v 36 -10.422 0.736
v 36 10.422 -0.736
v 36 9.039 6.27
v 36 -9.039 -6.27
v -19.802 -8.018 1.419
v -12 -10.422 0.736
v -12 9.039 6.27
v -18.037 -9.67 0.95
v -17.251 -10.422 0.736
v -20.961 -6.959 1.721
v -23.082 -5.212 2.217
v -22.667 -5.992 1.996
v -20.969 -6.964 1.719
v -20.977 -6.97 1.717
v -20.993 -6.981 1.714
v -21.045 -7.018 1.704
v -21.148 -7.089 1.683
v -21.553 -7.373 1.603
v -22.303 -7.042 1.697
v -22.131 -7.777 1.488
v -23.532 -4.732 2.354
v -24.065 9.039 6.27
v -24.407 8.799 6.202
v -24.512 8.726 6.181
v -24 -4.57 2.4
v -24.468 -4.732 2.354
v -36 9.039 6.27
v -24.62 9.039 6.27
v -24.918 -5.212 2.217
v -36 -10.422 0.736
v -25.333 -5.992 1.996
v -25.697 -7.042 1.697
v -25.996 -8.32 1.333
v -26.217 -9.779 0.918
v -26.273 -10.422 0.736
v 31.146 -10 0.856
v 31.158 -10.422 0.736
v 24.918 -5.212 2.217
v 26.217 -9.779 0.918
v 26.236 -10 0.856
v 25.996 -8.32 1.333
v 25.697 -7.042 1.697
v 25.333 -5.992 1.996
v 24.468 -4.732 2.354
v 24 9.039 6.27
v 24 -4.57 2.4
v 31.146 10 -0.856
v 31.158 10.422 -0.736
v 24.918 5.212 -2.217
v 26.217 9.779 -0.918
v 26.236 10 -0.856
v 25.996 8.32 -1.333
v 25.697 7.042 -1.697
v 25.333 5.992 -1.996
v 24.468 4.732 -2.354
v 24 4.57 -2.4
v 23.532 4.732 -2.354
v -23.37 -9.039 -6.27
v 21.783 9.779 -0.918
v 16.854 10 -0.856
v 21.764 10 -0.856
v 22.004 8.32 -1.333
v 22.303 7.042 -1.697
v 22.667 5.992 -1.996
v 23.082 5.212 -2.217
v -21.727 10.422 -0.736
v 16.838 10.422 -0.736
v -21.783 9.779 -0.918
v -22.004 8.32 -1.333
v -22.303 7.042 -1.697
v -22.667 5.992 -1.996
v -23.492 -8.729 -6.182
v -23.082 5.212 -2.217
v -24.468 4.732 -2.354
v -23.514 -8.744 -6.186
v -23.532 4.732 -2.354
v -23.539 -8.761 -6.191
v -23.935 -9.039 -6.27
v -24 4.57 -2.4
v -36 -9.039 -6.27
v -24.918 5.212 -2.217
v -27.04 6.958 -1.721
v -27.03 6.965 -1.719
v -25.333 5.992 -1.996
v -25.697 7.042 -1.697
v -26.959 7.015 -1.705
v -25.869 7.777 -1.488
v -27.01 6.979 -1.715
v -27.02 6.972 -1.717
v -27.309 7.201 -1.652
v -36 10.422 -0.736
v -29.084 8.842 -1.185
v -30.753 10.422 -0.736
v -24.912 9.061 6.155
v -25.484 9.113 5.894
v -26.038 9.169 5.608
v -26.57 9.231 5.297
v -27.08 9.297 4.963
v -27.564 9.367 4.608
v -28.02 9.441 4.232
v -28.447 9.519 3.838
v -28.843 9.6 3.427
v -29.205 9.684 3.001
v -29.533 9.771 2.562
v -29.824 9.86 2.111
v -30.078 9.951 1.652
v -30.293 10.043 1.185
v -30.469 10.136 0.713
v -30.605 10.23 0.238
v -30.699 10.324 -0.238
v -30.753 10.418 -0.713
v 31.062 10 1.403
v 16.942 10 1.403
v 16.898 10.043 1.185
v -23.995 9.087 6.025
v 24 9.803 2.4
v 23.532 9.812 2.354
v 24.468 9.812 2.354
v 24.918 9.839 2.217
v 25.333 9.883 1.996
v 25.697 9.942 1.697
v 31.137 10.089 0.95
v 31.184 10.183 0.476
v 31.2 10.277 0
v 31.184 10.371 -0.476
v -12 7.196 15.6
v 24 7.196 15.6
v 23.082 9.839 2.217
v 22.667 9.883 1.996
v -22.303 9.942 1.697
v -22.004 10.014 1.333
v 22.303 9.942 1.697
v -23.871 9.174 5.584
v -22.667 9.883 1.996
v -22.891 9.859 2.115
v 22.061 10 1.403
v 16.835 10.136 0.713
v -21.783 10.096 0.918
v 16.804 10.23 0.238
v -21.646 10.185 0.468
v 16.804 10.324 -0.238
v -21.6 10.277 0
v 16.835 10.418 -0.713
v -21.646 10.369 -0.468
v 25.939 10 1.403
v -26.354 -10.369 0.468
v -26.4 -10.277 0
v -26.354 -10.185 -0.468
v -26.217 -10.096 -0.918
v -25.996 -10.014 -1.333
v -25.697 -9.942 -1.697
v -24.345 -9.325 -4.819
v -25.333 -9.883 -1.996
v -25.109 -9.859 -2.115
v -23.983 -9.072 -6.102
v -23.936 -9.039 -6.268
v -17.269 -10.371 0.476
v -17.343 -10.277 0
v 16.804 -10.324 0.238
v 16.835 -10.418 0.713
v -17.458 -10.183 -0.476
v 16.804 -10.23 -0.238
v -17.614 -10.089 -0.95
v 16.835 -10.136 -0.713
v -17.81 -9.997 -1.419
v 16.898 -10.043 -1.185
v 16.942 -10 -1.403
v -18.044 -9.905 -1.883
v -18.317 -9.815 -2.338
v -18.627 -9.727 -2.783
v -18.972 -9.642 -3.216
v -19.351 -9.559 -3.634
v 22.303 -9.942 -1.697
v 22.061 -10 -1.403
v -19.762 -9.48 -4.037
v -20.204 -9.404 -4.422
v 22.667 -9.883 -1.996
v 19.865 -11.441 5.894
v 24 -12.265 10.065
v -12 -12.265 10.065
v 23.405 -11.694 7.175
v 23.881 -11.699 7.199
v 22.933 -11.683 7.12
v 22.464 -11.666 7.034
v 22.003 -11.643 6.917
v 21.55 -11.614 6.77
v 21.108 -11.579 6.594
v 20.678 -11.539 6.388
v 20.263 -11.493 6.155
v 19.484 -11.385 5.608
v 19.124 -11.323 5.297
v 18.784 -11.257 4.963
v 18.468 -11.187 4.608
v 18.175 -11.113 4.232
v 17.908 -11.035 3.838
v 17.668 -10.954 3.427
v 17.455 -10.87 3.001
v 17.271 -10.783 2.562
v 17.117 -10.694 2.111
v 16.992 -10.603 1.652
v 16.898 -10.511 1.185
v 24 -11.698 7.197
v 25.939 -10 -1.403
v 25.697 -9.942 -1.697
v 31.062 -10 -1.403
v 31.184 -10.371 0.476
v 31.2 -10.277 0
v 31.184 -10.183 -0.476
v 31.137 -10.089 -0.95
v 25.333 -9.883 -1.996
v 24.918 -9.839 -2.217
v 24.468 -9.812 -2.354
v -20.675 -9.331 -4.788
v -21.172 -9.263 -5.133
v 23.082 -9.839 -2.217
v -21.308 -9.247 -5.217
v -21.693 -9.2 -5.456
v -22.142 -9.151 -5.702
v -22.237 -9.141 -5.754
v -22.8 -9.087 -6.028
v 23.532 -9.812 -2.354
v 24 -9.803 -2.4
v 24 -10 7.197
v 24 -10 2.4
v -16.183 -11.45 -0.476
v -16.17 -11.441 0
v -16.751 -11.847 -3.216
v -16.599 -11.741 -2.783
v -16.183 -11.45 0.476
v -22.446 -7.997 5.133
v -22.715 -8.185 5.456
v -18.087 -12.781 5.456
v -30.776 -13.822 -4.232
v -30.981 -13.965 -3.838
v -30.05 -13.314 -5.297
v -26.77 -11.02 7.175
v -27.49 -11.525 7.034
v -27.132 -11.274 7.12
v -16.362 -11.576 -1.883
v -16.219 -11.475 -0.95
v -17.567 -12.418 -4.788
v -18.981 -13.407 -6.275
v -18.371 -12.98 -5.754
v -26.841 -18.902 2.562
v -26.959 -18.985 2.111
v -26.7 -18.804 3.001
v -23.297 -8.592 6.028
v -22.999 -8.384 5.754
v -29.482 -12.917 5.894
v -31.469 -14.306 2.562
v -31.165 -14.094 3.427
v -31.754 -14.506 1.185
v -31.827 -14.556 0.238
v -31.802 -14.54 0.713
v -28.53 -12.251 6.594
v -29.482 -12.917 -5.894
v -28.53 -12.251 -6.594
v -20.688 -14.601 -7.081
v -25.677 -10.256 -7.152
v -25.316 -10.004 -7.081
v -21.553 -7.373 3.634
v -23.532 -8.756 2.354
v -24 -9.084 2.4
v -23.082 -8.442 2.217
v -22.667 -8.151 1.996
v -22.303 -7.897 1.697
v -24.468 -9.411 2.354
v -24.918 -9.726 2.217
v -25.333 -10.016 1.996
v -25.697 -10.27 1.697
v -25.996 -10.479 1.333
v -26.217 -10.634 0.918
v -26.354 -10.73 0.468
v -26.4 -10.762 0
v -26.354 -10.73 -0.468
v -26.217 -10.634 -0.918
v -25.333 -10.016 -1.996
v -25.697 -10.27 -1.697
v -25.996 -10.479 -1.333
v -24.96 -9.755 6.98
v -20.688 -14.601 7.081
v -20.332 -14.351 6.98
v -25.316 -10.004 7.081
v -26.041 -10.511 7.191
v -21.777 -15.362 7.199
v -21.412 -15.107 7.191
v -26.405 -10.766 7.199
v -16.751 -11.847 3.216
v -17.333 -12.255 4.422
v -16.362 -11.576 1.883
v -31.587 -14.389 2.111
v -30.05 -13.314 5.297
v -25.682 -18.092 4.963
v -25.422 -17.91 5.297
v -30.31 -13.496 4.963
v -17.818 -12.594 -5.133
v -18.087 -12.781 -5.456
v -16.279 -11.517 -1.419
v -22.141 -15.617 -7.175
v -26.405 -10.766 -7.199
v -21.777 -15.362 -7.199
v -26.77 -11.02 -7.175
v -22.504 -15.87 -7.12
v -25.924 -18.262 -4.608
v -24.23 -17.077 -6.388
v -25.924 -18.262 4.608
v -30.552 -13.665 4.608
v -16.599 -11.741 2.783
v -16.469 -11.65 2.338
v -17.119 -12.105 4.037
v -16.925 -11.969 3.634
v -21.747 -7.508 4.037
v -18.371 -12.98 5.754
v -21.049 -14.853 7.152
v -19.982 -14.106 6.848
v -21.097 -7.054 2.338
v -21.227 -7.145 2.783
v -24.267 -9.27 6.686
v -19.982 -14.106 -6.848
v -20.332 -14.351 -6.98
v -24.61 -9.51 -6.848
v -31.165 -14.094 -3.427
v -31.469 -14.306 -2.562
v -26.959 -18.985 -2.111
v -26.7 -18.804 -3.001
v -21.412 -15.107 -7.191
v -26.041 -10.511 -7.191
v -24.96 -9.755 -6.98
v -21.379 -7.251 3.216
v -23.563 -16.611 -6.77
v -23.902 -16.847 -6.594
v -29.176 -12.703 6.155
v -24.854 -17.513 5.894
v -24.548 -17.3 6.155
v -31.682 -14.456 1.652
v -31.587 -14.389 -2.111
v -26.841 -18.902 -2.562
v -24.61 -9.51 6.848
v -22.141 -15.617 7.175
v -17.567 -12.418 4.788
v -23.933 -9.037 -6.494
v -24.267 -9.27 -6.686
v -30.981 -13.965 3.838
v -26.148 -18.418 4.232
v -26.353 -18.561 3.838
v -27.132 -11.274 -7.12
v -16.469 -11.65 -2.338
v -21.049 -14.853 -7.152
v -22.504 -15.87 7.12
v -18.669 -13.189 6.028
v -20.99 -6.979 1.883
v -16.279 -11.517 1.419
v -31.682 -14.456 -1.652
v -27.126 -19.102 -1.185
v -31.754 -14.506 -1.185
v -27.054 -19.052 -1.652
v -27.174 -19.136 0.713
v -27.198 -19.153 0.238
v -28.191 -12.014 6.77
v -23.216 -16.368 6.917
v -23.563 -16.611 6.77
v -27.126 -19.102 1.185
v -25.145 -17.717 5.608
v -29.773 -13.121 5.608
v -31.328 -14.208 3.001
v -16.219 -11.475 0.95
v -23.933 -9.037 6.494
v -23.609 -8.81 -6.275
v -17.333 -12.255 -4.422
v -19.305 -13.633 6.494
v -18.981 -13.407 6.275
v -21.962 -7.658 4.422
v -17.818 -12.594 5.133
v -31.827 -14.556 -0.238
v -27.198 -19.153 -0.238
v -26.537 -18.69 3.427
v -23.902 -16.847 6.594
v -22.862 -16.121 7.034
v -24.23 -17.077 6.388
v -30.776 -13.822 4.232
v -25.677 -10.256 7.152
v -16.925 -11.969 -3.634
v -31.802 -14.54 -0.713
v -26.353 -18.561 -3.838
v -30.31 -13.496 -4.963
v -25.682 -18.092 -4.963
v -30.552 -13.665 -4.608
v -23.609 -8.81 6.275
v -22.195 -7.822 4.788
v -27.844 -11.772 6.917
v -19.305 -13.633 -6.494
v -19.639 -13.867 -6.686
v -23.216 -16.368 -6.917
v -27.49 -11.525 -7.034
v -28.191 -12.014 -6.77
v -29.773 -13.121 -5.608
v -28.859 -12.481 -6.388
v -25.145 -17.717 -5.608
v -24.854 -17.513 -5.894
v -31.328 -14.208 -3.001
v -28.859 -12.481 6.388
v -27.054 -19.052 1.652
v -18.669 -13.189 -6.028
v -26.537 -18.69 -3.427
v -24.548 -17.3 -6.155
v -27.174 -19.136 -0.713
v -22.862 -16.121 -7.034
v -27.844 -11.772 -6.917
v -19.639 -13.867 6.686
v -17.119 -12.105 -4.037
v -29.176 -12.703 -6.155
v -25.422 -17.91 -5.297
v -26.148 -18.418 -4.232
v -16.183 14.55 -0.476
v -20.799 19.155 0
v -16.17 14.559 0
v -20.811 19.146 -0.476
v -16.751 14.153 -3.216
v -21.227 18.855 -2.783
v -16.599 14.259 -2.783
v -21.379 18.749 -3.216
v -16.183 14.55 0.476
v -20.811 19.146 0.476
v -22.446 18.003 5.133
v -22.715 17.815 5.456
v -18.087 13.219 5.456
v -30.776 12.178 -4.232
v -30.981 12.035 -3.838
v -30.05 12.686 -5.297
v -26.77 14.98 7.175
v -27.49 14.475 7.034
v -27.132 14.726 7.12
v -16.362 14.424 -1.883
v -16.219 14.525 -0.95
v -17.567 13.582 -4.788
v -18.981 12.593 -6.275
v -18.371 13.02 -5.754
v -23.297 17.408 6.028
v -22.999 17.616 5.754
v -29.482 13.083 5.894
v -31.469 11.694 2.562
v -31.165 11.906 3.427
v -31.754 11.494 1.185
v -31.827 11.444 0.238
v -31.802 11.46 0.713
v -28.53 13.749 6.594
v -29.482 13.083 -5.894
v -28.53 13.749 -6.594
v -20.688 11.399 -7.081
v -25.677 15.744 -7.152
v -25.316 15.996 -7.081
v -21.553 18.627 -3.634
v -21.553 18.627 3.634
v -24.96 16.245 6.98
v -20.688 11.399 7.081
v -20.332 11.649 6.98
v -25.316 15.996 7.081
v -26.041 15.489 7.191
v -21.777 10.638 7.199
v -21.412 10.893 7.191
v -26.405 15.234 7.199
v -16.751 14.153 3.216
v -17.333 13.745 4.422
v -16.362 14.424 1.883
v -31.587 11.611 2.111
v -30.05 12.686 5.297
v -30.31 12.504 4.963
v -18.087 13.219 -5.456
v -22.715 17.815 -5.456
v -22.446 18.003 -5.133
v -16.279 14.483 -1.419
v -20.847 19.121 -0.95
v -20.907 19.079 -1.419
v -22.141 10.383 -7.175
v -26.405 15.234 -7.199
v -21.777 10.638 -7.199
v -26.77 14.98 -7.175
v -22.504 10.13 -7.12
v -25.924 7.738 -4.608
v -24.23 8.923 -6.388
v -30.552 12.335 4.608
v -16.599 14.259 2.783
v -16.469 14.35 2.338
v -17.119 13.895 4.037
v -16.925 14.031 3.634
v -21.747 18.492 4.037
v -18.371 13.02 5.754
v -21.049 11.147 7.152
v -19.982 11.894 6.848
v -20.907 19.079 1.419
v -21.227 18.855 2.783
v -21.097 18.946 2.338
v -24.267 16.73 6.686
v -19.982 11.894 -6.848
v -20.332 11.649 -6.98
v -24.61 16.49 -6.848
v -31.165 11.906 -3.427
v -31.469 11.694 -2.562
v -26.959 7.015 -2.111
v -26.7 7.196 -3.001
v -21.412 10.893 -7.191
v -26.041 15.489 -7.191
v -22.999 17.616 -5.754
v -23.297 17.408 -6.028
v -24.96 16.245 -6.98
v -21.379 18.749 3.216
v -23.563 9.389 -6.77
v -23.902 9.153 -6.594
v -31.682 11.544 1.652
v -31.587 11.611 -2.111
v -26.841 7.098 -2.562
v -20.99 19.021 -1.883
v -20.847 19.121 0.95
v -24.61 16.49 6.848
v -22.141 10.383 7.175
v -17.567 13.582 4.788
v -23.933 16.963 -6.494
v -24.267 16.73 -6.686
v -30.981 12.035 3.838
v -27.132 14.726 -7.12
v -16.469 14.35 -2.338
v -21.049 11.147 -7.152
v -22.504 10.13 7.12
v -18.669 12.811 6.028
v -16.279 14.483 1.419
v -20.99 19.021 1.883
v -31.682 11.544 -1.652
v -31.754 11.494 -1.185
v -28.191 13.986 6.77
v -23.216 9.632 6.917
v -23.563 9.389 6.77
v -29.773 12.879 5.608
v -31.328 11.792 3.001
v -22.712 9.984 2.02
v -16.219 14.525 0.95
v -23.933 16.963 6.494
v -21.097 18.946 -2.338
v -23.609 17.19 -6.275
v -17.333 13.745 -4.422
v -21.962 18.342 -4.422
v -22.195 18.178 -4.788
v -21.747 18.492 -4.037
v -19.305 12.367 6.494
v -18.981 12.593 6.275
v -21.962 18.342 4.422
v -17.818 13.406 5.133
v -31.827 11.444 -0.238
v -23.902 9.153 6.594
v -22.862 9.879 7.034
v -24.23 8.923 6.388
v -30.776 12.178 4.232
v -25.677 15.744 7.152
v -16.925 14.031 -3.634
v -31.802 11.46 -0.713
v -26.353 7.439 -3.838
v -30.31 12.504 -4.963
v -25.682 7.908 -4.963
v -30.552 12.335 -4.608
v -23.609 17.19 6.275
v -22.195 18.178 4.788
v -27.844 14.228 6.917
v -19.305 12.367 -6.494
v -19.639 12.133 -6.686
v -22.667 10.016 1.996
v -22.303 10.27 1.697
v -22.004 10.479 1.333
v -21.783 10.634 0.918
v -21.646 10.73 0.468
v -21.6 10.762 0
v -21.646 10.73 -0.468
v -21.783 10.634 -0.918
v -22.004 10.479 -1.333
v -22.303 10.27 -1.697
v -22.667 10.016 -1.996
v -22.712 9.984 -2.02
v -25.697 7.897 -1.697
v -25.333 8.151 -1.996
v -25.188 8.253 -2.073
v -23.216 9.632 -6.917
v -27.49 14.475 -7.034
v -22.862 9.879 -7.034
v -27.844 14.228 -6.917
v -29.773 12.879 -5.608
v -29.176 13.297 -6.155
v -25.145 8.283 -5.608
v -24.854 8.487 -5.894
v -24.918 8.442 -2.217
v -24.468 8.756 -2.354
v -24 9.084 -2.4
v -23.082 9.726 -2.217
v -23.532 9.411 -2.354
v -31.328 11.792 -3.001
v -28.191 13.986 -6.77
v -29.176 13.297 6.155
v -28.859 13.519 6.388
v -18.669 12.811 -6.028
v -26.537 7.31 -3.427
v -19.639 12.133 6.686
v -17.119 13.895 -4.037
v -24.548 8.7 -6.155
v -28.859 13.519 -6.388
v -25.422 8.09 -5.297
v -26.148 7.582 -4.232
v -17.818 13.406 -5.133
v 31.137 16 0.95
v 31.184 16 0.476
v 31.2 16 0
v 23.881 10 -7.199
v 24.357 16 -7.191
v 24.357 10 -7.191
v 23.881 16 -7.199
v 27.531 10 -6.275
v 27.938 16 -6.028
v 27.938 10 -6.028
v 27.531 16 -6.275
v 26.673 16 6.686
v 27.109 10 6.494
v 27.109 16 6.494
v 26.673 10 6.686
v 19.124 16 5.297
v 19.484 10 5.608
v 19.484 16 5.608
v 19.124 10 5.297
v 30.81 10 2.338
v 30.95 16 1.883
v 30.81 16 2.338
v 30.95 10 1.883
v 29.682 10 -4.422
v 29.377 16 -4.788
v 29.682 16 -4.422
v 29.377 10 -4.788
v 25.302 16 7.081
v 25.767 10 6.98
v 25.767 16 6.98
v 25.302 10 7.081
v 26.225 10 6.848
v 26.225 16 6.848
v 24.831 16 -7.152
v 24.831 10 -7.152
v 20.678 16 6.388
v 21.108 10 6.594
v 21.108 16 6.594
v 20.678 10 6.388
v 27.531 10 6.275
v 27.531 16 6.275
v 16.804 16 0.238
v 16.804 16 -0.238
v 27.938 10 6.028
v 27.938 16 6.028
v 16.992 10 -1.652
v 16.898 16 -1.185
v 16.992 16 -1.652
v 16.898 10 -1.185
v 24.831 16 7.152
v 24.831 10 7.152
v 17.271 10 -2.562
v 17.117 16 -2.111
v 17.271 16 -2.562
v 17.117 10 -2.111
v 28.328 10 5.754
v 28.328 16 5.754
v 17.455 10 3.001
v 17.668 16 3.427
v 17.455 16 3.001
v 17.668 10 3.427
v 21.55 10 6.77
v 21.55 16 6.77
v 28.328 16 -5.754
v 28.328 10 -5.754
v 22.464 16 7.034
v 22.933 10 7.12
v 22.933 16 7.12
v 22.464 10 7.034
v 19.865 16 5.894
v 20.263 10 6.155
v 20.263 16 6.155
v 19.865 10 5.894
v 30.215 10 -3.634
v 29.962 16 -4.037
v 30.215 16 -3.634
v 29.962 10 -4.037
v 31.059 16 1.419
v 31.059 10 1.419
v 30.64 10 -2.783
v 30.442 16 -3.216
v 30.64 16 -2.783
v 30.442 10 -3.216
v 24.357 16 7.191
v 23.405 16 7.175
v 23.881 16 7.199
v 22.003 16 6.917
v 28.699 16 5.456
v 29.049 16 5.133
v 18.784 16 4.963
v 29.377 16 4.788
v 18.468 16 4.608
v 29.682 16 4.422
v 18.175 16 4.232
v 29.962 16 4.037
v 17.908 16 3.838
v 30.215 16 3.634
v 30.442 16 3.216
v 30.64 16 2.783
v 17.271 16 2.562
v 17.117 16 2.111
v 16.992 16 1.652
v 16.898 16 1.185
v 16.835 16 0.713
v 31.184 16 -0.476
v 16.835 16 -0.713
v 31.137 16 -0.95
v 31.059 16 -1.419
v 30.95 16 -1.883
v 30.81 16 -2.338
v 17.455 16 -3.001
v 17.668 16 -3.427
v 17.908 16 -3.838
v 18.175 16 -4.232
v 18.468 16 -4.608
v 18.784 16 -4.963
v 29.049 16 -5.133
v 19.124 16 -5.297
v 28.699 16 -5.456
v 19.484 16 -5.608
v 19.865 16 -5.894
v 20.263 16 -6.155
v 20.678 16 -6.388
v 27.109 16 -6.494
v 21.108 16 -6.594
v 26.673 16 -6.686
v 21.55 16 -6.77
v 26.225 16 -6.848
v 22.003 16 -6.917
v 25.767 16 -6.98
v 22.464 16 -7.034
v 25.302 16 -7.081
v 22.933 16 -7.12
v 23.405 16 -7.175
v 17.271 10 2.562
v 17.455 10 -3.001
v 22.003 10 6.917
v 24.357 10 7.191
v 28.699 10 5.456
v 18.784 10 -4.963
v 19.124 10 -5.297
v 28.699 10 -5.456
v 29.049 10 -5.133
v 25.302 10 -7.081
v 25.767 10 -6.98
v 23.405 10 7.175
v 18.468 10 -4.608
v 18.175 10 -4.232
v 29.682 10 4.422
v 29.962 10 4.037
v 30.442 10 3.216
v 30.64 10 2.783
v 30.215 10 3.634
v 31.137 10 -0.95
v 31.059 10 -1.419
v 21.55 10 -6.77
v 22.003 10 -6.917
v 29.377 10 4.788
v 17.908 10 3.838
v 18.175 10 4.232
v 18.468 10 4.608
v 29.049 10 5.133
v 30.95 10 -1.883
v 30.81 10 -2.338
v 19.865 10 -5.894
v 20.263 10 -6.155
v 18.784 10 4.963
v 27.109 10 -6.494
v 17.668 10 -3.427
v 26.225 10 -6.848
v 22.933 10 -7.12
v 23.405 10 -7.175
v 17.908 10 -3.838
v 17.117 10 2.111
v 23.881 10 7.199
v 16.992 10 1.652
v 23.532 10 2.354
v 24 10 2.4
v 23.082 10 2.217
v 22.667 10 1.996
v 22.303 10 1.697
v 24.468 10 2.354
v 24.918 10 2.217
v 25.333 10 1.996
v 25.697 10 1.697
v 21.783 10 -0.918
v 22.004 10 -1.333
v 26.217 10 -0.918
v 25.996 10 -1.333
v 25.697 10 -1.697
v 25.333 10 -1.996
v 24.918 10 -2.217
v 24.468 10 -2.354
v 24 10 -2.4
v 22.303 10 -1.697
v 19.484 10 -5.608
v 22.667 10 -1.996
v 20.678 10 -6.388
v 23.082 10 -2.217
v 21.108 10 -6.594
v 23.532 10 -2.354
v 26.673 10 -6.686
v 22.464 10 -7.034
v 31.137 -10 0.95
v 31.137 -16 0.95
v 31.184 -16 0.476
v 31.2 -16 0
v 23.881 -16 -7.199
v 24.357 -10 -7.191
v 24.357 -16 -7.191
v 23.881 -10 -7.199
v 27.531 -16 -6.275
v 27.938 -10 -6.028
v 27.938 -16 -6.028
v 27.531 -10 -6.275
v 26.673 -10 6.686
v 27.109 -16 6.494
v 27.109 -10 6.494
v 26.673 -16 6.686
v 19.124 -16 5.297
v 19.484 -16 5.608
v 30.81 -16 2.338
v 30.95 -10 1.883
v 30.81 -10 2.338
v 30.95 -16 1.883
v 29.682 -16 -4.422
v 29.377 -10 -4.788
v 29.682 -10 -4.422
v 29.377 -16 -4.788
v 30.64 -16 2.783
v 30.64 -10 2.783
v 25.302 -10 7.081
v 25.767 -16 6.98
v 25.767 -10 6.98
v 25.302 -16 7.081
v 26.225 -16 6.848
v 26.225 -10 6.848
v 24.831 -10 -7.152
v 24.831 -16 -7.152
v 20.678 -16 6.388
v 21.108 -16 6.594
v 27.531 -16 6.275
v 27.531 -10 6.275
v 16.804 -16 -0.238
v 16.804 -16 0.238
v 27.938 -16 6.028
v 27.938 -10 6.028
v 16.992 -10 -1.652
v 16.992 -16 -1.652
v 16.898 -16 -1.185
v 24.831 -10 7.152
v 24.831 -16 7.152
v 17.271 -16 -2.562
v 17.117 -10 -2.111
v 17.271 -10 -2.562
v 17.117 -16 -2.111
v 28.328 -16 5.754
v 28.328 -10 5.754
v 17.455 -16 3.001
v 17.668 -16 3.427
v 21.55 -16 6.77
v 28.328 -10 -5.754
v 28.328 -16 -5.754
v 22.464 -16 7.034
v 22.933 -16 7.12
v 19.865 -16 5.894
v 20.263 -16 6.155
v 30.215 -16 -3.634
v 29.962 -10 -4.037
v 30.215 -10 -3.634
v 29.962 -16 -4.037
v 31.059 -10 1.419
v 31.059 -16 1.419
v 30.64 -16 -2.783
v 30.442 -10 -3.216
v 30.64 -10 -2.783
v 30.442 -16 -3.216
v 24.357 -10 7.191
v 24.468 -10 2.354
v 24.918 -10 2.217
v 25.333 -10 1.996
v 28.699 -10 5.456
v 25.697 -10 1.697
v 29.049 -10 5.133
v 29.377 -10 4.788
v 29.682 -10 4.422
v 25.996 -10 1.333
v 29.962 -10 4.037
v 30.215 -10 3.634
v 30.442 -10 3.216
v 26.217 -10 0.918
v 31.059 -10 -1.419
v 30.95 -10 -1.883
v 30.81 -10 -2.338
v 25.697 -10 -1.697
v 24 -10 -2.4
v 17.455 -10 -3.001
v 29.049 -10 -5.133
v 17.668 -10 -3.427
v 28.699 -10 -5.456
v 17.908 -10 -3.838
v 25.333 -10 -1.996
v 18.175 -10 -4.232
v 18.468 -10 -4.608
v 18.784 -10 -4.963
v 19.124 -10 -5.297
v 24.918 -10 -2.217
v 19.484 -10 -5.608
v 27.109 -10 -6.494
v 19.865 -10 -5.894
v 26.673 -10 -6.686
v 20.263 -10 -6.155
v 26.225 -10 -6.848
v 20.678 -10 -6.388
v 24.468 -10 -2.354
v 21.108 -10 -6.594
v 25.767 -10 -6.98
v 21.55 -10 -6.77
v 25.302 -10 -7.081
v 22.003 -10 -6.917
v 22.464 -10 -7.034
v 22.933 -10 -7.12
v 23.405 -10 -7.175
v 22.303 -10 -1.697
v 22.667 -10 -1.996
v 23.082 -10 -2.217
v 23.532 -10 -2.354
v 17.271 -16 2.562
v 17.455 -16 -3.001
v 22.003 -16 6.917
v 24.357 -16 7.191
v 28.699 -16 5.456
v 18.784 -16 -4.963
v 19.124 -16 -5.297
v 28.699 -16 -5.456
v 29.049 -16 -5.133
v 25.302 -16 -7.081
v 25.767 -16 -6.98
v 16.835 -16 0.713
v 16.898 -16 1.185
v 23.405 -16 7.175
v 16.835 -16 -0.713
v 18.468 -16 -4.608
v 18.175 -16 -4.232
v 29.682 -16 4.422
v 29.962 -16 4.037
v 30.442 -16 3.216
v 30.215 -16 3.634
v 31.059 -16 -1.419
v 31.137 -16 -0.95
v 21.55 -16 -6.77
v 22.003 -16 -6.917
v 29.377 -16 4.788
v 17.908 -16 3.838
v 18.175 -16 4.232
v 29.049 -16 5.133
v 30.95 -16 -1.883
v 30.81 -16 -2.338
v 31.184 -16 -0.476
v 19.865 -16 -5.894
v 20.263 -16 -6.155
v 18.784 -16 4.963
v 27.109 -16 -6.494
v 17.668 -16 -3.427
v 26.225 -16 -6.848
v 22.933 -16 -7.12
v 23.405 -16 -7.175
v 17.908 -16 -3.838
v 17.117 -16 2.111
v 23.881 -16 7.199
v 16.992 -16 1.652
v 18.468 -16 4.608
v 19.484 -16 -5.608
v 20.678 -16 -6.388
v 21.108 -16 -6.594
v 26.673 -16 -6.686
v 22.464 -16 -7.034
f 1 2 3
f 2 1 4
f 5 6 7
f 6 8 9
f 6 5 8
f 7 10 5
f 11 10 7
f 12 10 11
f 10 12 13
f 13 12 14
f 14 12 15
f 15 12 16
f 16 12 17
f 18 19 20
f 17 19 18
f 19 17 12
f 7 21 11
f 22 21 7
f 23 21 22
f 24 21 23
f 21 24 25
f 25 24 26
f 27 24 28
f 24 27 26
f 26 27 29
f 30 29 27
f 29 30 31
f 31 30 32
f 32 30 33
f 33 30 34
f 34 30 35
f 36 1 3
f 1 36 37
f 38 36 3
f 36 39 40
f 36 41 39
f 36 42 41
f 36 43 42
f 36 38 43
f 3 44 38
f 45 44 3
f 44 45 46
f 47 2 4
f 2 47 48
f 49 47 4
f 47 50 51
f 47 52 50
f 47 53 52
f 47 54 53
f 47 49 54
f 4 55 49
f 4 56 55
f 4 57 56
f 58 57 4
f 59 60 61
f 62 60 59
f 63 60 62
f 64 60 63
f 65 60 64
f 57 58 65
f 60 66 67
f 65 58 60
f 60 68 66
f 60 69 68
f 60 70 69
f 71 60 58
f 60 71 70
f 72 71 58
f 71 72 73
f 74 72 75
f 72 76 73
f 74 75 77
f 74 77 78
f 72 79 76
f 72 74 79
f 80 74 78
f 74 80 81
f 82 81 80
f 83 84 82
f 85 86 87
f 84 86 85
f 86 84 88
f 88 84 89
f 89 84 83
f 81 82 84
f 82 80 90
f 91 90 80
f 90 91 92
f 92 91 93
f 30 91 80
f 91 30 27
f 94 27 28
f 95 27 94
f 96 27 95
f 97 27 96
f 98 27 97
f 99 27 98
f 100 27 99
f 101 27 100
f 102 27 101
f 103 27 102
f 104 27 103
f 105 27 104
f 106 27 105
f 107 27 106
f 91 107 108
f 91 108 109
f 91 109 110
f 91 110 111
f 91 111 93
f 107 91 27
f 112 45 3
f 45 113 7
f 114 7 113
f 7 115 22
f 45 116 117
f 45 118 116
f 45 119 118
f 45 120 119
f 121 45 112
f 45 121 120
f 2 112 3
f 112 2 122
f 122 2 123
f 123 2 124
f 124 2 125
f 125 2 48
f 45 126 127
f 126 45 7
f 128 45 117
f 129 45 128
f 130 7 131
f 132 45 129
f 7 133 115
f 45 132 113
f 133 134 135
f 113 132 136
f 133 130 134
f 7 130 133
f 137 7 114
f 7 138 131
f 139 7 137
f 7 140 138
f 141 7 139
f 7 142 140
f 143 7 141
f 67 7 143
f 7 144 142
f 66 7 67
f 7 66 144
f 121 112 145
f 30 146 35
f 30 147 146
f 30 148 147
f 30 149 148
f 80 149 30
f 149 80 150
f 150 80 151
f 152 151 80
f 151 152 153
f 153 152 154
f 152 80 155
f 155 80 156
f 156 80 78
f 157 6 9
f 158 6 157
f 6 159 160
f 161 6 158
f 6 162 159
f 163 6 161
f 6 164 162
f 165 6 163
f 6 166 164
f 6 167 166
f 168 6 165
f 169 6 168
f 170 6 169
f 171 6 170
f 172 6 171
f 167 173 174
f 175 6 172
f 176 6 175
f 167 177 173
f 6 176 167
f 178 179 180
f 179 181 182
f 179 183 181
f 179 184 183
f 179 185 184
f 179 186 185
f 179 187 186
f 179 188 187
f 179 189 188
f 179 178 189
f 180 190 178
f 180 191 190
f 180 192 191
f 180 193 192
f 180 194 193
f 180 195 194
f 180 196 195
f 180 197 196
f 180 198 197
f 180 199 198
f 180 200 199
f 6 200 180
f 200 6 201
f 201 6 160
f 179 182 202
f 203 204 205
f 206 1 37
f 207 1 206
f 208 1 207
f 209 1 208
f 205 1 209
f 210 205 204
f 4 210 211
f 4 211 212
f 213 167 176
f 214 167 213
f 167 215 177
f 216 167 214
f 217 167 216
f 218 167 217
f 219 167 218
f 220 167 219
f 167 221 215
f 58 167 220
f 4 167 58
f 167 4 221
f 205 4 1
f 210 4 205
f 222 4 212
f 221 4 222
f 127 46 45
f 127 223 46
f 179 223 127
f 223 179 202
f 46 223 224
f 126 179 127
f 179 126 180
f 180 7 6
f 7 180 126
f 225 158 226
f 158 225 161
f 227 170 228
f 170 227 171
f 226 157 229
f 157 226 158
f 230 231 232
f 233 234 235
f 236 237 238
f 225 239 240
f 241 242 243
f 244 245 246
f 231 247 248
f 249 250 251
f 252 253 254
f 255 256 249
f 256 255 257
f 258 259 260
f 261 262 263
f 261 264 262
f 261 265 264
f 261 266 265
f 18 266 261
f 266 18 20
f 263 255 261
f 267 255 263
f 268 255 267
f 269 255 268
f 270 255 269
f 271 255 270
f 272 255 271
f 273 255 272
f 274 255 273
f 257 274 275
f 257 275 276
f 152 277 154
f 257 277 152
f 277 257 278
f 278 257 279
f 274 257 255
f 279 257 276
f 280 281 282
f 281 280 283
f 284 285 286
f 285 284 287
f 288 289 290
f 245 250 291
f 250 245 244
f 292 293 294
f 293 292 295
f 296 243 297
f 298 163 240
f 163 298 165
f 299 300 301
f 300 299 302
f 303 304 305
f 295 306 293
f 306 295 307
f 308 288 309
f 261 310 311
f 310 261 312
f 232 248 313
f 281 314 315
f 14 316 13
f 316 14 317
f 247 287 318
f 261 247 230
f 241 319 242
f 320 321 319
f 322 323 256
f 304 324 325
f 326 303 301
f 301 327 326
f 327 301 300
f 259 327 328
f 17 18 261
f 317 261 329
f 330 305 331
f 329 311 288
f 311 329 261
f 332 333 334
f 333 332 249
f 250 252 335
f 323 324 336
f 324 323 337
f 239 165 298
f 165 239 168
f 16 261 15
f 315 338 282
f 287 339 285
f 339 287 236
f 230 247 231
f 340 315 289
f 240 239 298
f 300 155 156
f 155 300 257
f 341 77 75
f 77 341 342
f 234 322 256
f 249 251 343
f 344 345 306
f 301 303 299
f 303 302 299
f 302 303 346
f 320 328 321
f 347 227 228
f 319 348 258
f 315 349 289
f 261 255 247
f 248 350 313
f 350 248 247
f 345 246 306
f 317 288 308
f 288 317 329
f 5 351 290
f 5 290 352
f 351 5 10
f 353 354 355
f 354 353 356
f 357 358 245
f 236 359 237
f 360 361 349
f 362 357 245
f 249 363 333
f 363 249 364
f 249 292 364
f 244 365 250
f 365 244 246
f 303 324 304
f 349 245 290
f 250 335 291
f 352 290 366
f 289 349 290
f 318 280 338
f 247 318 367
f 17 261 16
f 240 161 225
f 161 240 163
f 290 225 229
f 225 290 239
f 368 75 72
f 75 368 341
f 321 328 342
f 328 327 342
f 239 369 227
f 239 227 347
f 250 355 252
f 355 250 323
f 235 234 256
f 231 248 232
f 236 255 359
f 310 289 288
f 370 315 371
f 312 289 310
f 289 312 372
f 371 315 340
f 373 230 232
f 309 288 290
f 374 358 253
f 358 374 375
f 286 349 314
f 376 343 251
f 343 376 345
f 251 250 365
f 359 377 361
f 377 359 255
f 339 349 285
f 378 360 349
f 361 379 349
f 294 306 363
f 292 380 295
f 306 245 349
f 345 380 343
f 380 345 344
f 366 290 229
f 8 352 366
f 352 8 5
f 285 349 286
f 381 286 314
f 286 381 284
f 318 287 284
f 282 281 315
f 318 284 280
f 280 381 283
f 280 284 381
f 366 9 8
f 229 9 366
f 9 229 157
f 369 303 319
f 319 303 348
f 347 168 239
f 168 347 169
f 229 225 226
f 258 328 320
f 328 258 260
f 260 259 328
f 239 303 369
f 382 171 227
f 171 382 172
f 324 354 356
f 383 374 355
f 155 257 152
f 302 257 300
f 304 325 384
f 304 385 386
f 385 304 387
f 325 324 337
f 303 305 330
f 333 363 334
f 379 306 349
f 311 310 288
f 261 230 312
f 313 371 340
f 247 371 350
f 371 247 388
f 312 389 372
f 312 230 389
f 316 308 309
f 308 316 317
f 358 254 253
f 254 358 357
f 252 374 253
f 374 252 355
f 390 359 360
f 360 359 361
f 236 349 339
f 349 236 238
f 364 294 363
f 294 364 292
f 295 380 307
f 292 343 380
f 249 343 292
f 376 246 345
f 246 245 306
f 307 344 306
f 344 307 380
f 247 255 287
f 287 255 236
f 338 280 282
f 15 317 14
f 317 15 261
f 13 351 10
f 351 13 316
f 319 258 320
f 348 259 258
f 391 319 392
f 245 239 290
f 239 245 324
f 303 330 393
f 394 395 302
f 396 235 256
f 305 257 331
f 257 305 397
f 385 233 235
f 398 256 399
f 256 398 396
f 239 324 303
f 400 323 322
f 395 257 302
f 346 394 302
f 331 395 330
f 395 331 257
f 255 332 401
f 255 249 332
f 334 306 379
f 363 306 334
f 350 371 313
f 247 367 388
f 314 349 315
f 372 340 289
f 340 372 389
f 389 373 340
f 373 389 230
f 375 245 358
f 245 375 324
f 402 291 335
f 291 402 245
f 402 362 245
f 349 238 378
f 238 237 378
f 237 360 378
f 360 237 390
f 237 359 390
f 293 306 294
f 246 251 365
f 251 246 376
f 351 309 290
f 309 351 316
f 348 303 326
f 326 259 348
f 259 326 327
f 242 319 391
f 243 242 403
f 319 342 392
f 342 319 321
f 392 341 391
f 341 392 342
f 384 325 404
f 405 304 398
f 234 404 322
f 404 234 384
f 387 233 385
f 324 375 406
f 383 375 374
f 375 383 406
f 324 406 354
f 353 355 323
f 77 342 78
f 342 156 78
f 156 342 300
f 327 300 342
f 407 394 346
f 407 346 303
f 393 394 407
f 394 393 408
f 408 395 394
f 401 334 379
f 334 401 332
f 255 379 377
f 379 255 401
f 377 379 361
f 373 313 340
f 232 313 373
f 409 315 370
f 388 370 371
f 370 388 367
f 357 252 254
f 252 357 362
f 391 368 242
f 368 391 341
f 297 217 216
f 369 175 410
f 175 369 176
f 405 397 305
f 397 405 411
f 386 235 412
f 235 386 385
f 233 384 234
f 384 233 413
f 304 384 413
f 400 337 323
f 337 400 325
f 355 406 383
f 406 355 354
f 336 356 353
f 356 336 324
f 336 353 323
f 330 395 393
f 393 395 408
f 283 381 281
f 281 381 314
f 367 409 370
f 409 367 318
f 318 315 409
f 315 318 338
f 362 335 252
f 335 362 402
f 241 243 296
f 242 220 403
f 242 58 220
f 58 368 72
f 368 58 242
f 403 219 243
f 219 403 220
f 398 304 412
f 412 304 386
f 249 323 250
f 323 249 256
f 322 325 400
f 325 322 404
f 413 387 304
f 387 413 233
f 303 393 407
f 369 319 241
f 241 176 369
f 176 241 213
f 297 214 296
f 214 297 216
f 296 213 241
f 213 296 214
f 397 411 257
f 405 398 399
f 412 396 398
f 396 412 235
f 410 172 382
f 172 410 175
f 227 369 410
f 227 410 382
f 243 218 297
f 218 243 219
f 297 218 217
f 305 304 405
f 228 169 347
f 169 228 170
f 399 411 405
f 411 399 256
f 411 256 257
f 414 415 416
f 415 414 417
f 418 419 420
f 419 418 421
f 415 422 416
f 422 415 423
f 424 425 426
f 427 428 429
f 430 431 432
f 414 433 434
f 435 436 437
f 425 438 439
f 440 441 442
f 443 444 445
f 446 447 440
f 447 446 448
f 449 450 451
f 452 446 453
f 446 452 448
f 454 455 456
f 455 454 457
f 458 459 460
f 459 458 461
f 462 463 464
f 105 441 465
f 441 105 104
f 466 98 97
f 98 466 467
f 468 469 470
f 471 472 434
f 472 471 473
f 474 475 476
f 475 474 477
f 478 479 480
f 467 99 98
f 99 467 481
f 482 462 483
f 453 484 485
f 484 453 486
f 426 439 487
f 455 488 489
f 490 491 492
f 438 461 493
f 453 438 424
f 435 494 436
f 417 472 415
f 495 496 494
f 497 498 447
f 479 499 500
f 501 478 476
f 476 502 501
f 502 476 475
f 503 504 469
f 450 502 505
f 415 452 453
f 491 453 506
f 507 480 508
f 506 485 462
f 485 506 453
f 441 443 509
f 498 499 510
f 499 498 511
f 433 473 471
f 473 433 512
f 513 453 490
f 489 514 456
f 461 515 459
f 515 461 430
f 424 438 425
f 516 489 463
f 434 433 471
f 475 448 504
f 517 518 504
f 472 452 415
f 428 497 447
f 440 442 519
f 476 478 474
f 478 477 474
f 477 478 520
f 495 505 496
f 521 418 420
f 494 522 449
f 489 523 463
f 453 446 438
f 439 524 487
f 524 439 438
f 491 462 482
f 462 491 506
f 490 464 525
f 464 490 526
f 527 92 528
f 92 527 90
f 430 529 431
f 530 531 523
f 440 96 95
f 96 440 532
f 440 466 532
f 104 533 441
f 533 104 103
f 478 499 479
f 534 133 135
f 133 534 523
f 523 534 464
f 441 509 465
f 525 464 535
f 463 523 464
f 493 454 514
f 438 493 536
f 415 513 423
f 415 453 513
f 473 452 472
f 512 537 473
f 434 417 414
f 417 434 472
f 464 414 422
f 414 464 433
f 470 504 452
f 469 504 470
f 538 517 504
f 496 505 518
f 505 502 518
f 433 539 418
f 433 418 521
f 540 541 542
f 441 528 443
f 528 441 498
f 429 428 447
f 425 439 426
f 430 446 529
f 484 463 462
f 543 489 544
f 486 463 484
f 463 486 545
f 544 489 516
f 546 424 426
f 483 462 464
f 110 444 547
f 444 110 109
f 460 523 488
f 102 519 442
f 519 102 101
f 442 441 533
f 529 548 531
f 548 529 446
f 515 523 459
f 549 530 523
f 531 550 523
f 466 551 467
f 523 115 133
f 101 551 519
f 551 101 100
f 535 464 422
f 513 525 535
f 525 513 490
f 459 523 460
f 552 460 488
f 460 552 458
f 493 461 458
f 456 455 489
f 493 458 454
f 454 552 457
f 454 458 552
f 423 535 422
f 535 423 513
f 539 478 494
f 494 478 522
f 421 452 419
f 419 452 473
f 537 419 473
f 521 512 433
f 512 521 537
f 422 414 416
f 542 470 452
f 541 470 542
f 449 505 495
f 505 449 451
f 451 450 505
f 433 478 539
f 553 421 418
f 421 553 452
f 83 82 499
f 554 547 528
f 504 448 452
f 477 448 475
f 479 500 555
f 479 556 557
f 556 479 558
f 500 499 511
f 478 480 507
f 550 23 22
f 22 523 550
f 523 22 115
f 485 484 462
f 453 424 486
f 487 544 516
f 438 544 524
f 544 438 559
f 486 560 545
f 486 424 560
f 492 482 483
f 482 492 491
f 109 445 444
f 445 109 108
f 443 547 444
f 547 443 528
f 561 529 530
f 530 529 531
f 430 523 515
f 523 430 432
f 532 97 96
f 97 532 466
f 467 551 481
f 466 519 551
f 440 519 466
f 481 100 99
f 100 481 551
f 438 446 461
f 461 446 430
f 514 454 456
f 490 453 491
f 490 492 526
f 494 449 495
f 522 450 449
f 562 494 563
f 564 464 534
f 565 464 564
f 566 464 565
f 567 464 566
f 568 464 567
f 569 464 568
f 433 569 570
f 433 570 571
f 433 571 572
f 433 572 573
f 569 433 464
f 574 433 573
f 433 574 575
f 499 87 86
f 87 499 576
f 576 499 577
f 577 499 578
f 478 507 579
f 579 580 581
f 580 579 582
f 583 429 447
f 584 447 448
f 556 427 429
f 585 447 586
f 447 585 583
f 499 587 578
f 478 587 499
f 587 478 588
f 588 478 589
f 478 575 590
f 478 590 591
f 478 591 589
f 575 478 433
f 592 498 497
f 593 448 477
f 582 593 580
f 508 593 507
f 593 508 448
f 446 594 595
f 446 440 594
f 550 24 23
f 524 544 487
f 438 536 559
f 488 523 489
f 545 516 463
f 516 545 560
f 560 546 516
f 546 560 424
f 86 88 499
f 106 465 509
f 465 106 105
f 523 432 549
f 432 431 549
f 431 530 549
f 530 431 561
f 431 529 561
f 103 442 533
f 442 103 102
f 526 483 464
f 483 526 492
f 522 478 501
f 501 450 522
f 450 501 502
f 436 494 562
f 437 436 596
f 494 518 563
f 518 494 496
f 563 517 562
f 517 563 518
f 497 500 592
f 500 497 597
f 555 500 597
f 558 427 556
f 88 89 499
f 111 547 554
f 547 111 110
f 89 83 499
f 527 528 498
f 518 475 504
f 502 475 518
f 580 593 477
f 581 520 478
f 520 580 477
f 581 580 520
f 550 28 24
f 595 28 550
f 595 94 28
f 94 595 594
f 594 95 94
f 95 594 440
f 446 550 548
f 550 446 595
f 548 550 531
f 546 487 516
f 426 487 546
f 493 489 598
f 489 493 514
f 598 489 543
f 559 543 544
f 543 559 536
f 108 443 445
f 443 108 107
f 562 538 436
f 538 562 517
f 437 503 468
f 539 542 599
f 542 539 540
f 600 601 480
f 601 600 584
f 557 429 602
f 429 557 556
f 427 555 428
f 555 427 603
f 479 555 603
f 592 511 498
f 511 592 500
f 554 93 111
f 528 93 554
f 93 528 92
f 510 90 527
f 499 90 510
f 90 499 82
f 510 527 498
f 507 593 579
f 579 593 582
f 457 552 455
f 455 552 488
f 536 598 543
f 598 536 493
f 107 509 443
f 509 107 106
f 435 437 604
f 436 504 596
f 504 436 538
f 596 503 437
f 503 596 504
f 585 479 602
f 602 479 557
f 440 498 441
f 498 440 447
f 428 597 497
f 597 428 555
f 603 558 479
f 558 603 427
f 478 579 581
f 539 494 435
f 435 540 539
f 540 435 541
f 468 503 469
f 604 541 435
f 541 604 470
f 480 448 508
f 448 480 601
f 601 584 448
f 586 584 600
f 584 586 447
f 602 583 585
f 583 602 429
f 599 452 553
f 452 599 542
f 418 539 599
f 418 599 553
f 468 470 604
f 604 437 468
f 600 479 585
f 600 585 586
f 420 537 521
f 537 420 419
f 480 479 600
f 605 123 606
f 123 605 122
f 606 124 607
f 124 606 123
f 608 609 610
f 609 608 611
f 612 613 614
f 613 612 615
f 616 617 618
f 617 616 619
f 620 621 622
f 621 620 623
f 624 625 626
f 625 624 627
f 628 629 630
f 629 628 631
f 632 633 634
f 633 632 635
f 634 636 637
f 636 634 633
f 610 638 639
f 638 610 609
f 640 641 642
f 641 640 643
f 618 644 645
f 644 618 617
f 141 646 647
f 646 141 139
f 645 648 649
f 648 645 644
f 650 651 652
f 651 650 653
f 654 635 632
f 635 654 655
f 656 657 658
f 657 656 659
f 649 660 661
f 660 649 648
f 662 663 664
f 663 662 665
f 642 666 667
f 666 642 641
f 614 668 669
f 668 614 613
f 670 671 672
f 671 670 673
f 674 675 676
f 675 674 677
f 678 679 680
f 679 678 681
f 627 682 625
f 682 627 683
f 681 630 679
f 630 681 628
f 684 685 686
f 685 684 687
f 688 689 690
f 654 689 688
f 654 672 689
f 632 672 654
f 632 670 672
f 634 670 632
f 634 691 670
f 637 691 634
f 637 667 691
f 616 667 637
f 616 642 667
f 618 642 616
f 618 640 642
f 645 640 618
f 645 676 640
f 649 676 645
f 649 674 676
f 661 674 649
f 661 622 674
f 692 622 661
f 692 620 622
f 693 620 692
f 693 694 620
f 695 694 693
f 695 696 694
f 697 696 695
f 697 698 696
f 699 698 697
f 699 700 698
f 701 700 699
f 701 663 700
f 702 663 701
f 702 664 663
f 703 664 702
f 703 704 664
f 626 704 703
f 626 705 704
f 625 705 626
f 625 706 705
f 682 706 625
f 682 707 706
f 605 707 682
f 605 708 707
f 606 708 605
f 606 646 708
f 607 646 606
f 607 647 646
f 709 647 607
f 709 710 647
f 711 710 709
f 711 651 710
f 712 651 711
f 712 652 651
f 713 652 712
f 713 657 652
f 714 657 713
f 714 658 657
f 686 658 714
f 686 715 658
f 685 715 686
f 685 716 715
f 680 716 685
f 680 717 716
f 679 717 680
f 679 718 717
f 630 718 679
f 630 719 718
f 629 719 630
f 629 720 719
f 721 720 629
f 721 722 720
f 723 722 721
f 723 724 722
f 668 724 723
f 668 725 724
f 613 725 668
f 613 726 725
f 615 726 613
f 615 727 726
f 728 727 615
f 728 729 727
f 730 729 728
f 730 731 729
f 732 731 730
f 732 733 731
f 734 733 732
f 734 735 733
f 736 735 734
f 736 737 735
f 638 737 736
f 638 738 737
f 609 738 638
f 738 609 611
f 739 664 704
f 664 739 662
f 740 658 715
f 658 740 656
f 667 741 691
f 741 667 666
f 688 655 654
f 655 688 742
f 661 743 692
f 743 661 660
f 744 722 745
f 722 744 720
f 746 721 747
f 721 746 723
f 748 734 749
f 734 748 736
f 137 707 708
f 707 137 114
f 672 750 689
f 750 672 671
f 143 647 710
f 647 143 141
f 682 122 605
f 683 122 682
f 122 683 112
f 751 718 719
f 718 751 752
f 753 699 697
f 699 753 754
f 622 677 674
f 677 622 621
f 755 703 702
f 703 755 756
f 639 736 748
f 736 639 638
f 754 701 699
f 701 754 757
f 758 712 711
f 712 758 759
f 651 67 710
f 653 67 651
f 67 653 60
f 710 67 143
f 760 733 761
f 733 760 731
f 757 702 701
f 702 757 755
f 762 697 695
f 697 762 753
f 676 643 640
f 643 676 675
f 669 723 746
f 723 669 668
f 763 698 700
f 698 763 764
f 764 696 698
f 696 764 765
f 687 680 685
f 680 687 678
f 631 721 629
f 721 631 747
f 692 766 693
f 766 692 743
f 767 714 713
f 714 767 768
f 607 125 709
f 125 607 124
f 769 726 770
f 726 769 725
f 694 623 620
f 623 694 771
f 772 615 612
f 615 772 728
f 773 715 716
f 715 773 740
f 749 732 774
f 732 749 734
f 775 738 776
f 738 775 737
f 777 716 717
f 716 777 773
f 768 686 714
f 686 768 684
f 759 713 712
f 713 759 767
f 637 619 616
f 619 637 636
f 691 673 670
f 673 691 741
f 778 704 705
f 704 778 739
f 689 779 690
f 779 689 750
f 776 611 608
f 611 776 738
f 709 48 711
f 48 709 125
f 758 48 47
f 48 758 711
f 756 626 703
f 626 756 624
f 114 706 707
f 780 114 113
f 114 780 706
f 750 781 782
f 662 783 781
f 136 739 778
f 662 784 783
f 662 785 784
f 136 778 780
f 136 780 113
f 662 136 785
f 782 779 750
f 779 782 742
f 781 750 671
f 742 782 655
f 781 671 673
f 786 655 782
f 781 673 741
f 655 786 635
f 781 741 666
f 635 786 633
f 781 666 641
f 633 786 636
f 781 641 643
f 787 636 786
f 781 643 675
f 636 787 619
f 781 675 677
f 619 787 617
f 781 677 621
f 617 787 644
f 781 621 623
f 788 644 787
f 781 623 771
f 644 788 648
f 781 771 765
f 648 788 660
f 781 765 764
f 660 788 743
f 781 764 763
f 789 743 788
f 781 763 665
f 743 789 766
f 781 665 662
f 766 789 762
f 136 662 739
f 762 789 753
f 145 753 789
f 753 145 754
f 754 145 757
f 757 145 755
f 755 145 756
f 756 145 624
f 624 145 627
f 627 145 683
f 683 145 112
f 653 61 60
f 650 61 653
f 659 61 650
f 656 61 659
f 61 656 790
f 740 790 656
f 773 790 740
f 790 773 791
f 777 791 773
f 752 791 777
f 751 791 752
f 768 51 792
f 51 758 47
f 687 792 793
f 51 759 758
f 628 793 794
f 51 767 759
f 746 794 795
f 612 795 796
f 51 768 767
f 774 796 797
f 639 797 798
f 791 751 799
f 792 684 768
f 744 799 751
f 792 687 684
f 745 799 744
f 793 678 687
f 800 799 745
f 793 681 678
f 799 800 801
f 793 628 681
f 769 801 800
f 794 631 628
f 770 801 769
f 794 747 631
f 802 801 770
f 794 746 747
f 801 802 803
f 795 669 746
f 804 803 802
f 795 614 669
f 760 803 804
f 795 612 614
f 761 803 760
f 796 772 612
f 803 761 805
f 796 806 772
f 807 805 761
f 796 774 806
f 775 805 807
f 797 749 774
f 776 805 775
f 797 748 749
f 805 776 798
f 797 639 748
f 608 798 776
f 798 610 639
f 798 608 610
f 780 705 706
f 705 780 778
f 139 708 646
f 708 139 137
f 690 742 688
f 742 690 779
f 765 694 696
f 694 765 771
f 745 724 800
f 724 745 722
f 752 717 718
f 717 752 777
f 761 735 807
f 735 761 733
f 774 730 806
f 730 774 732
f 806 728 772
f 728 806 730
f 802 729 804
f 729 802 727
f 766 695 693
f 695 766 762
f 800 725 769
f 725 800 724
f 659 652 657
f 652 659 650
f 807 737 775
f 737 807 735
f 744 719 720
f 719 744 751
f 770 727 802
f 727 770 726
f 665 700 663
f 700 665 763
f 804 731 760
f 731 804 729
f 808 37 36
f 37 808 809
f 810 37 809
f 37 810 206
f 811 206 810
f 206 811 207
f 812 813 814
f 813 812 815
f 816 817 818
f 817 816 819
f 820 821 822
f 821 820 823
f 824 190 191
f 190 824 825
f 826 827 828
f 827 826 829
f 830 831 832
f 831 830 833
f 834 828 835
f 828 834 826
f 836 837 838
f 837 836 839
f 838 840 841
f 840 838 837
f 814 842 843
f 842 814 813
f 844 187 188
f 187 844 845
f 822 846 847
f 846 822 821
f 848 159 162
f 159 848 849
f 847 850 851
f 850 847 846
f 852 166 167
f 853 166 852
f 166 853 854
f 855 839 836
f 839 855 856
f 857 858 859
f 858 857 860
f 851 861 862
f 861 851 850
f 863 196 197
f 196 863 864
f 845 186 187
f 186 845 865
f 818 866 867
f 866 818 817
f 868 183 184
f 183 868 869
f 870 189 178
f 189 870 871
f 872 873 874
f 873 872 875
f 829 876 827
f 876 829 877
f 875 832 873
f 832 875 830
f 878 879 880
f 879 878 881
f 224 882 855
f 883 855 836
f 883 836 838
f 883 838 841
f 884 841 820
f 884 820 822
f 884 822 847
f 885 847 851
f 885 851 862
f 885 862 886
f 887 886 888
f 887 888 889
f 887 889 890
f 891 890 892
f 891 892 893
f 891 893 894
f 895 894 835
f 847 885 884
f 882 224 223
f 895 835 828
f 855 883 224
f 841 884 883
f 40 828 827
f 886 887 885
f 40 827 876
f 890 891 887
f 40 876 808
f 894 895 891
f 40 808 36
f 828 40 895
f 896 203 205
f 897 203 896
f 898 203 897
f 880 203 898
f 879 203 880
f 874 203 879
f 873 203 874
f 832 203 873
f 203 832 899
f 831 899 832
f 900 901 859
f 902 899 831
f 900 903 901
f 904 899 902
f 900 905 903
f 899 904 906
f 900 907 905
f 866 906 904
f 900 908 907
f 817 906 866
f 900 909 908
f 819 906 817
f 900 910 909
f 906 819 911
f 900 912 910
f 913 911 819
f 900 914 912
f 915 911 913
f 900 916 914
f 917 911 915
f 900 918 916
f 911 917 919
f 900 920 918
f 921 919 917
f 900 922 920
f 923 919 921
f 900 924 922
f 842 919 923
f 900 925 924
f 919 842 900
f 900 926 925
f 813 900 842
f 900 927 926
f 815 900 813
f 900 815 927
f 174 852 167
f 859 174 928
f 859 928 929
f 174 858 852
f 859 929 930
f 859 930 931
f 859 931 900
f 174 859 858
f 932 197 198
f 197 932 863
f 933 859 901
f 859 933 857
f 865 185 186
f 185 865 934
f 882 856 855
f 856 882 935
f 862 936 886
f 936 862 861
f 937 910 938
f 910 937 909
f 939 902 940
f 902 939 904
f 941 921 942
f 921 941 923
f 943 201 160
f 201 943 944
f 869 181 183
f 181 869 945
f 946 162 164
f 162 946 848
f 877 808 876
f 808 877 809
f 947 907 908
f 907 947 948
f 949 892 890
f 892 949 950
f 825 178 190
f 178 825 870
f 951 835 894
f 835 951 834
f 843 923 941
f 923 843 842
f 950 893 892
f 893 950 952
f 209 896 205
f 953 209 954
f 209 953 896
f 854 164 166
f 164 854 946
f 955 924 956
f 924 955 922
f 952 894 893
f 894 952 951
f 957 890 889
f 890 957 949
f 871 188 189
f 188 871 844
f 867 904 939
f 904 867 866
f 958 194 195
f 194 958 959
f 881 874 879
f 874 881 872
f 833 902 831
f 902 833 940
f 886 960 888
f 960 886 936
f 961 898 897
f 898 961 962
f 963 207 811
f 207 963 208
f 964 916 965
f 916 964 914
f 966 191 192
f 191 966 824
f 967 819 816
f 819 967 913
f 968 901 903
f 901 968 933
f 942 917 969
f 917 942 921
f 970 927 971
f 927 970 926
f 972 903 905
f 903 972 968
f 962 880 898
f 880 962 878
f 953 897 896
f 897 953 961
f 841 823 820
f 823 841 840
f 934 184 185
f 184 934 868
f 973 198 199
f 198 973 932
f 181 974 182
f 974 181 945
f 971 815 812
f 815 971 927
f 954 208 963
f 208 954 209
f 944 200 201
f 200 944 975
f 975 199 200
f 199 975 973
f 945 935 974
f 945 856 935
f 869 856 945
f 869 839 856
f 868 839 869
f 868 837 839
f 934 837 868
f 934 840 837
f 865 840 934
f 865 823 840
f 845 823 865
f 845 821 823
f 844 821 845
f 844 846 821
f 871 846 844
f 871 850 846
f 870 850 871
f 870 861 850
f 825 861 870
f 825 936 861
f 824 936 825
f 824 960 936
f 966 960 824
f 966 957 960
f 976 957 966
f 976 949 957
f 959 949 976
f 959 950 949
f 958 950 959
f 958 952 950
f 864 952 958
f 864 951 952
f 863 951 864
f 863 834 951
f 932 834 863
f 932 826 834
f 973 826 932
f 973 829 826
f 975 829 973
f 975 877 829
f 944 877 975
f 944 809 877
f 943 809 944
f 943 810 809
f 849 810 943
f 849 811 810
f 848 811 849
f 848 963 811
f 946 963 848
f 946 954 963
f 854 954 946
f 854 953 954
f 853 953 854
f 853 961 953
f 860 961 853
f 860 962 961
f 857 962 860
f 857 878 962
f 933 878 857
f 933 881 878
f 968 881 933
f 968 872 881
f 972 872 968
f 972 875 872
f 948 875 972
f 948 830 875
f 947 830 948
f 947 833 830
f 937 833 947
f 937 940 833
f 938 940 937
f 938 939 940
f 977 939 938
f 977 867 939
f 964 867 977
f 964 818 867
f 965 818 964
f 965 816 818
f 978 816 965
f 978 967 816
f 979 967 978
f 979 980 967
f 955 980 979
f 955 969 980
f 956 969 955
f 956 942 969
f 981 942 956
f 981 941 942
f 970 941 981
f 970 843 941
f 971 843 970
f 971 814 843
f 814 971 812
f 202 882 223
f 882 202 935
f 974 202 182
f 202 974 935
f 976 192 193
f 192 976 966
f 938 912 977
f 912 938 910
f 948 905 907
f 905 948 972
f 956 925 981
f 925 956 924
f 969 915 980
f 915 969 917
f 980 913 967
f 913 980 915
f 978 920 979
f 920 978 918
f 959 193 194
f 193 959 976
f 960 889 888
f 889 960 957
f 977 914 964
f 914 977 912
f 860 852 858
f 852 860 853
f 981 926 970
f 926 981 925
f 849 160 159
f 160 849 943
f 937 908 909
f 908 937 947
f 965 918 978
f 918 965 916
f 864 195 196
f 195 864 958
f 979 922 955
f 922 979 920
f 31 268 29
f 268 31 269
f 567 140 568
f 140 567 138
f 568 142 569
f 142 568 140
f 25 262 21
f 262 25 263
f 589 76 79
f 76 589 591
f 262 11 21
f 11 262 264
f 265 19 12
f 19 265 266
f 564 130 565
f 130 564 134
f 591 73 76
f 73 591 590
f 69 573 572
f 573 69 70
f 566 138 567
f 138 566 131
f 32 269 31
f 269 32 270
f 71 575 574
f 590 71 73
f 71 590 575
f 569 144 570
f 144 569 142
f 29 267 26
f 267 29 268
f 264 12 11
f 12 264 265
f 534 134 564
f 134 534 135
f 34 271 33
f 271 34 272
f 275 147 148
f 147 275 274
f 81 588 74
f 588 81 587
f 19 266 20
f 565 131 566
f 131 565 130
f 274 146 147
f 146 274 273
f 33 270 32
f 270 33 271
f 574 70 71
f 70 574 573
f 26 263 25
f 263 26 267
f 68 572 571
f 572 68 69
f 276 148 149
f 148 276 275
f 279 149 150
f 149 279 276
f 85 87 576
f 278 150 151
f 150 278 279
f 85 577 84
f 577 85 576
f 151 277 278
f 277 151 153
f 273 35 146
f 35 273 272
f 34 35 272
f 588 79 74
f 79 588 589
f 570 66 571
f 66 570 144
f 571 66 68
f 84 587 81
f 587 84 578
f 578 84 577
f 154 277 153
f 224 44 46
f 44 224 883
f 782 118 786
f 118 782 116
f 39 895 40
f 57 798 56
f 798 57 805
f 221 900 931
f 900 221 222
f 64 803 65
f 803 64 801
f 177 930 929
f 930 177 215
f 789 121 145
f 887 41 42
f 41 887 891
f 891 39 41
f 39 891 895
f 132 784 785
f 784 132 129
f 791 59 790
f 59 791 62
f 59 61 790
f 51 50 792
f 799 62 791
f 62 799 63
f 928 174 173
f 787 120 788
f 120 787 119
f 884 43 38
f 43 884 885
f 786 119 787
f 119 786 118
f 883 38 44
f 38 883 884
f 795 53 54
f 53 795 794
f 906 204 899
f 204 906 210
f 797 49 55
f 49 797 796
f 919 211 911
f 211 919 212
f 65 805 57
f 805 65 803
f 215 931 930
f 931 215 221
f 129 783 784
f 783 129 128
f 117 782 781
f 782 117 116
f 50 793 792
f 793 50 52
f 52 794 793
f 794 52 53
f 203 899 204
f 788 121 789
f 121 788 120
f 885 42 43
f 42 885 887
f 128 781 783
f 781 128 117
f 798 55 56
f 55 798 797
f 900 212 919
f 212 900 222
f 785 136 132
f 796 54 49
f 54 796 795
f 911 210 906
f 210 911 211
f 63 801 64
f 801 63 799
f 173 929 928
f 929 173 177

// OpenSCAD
// RESOLUTION SETTINGS
$fa = 1;
$fs = 0.4;

wheel_radius = 6;
base_height = 6;
base_top = 8;
wheel_track = 13;
wheel_width = 6;
wheel_rotation = 40;

// CAR BODY
scale([1.2, 1, 1.2])
{
	rotate([wheel_rotation/3, 0, 0])
	{
		// BASE
		cube([60, 20, base_height], center = true);
		// TOP
		translate([5, 0, (base_height/2 + base_top/2) 	- 0.01])
			cube([30, 20, base_top], center = true);
	}

// WHEELS
// FRONT LEFT
translate([-20, -wheel_track, 0])
	rotate([90, 0, wheel_rotation])
		cylinder(h = wheel_width, r = wheel_radius, center = true);
// FRONT RIGHT
translate([-20, wheel_track, 0])
	rotate([90, 0, wheel_rotation])
		cylinder(h = wheel_width, r = wheel_radius, center = true);

// REAR RIGHT
translate([20, wheel_track, 0])
	rotate([90, 0, 0])
		cylinder(h = wheel_width, r = wheel_radius, center = true);
// REAR LEFT
translate([20, -wheel_track, 0])
	rotate([90, 0, 0])
		cylinder(h = wheel_width, r = wheel_radius, center = true);

// AXLES
// FRONT
translate([-20, 0, 0])
	rotate([90, 0, 0])
		cylinder(h = wheel_track * 2, r = 2, center = true);
// REAR
translate([20, 0, 0])
	rotate([90, 0, 0])
		cylinder(h = wheel_track * 2, r = 2, center = true);
}
